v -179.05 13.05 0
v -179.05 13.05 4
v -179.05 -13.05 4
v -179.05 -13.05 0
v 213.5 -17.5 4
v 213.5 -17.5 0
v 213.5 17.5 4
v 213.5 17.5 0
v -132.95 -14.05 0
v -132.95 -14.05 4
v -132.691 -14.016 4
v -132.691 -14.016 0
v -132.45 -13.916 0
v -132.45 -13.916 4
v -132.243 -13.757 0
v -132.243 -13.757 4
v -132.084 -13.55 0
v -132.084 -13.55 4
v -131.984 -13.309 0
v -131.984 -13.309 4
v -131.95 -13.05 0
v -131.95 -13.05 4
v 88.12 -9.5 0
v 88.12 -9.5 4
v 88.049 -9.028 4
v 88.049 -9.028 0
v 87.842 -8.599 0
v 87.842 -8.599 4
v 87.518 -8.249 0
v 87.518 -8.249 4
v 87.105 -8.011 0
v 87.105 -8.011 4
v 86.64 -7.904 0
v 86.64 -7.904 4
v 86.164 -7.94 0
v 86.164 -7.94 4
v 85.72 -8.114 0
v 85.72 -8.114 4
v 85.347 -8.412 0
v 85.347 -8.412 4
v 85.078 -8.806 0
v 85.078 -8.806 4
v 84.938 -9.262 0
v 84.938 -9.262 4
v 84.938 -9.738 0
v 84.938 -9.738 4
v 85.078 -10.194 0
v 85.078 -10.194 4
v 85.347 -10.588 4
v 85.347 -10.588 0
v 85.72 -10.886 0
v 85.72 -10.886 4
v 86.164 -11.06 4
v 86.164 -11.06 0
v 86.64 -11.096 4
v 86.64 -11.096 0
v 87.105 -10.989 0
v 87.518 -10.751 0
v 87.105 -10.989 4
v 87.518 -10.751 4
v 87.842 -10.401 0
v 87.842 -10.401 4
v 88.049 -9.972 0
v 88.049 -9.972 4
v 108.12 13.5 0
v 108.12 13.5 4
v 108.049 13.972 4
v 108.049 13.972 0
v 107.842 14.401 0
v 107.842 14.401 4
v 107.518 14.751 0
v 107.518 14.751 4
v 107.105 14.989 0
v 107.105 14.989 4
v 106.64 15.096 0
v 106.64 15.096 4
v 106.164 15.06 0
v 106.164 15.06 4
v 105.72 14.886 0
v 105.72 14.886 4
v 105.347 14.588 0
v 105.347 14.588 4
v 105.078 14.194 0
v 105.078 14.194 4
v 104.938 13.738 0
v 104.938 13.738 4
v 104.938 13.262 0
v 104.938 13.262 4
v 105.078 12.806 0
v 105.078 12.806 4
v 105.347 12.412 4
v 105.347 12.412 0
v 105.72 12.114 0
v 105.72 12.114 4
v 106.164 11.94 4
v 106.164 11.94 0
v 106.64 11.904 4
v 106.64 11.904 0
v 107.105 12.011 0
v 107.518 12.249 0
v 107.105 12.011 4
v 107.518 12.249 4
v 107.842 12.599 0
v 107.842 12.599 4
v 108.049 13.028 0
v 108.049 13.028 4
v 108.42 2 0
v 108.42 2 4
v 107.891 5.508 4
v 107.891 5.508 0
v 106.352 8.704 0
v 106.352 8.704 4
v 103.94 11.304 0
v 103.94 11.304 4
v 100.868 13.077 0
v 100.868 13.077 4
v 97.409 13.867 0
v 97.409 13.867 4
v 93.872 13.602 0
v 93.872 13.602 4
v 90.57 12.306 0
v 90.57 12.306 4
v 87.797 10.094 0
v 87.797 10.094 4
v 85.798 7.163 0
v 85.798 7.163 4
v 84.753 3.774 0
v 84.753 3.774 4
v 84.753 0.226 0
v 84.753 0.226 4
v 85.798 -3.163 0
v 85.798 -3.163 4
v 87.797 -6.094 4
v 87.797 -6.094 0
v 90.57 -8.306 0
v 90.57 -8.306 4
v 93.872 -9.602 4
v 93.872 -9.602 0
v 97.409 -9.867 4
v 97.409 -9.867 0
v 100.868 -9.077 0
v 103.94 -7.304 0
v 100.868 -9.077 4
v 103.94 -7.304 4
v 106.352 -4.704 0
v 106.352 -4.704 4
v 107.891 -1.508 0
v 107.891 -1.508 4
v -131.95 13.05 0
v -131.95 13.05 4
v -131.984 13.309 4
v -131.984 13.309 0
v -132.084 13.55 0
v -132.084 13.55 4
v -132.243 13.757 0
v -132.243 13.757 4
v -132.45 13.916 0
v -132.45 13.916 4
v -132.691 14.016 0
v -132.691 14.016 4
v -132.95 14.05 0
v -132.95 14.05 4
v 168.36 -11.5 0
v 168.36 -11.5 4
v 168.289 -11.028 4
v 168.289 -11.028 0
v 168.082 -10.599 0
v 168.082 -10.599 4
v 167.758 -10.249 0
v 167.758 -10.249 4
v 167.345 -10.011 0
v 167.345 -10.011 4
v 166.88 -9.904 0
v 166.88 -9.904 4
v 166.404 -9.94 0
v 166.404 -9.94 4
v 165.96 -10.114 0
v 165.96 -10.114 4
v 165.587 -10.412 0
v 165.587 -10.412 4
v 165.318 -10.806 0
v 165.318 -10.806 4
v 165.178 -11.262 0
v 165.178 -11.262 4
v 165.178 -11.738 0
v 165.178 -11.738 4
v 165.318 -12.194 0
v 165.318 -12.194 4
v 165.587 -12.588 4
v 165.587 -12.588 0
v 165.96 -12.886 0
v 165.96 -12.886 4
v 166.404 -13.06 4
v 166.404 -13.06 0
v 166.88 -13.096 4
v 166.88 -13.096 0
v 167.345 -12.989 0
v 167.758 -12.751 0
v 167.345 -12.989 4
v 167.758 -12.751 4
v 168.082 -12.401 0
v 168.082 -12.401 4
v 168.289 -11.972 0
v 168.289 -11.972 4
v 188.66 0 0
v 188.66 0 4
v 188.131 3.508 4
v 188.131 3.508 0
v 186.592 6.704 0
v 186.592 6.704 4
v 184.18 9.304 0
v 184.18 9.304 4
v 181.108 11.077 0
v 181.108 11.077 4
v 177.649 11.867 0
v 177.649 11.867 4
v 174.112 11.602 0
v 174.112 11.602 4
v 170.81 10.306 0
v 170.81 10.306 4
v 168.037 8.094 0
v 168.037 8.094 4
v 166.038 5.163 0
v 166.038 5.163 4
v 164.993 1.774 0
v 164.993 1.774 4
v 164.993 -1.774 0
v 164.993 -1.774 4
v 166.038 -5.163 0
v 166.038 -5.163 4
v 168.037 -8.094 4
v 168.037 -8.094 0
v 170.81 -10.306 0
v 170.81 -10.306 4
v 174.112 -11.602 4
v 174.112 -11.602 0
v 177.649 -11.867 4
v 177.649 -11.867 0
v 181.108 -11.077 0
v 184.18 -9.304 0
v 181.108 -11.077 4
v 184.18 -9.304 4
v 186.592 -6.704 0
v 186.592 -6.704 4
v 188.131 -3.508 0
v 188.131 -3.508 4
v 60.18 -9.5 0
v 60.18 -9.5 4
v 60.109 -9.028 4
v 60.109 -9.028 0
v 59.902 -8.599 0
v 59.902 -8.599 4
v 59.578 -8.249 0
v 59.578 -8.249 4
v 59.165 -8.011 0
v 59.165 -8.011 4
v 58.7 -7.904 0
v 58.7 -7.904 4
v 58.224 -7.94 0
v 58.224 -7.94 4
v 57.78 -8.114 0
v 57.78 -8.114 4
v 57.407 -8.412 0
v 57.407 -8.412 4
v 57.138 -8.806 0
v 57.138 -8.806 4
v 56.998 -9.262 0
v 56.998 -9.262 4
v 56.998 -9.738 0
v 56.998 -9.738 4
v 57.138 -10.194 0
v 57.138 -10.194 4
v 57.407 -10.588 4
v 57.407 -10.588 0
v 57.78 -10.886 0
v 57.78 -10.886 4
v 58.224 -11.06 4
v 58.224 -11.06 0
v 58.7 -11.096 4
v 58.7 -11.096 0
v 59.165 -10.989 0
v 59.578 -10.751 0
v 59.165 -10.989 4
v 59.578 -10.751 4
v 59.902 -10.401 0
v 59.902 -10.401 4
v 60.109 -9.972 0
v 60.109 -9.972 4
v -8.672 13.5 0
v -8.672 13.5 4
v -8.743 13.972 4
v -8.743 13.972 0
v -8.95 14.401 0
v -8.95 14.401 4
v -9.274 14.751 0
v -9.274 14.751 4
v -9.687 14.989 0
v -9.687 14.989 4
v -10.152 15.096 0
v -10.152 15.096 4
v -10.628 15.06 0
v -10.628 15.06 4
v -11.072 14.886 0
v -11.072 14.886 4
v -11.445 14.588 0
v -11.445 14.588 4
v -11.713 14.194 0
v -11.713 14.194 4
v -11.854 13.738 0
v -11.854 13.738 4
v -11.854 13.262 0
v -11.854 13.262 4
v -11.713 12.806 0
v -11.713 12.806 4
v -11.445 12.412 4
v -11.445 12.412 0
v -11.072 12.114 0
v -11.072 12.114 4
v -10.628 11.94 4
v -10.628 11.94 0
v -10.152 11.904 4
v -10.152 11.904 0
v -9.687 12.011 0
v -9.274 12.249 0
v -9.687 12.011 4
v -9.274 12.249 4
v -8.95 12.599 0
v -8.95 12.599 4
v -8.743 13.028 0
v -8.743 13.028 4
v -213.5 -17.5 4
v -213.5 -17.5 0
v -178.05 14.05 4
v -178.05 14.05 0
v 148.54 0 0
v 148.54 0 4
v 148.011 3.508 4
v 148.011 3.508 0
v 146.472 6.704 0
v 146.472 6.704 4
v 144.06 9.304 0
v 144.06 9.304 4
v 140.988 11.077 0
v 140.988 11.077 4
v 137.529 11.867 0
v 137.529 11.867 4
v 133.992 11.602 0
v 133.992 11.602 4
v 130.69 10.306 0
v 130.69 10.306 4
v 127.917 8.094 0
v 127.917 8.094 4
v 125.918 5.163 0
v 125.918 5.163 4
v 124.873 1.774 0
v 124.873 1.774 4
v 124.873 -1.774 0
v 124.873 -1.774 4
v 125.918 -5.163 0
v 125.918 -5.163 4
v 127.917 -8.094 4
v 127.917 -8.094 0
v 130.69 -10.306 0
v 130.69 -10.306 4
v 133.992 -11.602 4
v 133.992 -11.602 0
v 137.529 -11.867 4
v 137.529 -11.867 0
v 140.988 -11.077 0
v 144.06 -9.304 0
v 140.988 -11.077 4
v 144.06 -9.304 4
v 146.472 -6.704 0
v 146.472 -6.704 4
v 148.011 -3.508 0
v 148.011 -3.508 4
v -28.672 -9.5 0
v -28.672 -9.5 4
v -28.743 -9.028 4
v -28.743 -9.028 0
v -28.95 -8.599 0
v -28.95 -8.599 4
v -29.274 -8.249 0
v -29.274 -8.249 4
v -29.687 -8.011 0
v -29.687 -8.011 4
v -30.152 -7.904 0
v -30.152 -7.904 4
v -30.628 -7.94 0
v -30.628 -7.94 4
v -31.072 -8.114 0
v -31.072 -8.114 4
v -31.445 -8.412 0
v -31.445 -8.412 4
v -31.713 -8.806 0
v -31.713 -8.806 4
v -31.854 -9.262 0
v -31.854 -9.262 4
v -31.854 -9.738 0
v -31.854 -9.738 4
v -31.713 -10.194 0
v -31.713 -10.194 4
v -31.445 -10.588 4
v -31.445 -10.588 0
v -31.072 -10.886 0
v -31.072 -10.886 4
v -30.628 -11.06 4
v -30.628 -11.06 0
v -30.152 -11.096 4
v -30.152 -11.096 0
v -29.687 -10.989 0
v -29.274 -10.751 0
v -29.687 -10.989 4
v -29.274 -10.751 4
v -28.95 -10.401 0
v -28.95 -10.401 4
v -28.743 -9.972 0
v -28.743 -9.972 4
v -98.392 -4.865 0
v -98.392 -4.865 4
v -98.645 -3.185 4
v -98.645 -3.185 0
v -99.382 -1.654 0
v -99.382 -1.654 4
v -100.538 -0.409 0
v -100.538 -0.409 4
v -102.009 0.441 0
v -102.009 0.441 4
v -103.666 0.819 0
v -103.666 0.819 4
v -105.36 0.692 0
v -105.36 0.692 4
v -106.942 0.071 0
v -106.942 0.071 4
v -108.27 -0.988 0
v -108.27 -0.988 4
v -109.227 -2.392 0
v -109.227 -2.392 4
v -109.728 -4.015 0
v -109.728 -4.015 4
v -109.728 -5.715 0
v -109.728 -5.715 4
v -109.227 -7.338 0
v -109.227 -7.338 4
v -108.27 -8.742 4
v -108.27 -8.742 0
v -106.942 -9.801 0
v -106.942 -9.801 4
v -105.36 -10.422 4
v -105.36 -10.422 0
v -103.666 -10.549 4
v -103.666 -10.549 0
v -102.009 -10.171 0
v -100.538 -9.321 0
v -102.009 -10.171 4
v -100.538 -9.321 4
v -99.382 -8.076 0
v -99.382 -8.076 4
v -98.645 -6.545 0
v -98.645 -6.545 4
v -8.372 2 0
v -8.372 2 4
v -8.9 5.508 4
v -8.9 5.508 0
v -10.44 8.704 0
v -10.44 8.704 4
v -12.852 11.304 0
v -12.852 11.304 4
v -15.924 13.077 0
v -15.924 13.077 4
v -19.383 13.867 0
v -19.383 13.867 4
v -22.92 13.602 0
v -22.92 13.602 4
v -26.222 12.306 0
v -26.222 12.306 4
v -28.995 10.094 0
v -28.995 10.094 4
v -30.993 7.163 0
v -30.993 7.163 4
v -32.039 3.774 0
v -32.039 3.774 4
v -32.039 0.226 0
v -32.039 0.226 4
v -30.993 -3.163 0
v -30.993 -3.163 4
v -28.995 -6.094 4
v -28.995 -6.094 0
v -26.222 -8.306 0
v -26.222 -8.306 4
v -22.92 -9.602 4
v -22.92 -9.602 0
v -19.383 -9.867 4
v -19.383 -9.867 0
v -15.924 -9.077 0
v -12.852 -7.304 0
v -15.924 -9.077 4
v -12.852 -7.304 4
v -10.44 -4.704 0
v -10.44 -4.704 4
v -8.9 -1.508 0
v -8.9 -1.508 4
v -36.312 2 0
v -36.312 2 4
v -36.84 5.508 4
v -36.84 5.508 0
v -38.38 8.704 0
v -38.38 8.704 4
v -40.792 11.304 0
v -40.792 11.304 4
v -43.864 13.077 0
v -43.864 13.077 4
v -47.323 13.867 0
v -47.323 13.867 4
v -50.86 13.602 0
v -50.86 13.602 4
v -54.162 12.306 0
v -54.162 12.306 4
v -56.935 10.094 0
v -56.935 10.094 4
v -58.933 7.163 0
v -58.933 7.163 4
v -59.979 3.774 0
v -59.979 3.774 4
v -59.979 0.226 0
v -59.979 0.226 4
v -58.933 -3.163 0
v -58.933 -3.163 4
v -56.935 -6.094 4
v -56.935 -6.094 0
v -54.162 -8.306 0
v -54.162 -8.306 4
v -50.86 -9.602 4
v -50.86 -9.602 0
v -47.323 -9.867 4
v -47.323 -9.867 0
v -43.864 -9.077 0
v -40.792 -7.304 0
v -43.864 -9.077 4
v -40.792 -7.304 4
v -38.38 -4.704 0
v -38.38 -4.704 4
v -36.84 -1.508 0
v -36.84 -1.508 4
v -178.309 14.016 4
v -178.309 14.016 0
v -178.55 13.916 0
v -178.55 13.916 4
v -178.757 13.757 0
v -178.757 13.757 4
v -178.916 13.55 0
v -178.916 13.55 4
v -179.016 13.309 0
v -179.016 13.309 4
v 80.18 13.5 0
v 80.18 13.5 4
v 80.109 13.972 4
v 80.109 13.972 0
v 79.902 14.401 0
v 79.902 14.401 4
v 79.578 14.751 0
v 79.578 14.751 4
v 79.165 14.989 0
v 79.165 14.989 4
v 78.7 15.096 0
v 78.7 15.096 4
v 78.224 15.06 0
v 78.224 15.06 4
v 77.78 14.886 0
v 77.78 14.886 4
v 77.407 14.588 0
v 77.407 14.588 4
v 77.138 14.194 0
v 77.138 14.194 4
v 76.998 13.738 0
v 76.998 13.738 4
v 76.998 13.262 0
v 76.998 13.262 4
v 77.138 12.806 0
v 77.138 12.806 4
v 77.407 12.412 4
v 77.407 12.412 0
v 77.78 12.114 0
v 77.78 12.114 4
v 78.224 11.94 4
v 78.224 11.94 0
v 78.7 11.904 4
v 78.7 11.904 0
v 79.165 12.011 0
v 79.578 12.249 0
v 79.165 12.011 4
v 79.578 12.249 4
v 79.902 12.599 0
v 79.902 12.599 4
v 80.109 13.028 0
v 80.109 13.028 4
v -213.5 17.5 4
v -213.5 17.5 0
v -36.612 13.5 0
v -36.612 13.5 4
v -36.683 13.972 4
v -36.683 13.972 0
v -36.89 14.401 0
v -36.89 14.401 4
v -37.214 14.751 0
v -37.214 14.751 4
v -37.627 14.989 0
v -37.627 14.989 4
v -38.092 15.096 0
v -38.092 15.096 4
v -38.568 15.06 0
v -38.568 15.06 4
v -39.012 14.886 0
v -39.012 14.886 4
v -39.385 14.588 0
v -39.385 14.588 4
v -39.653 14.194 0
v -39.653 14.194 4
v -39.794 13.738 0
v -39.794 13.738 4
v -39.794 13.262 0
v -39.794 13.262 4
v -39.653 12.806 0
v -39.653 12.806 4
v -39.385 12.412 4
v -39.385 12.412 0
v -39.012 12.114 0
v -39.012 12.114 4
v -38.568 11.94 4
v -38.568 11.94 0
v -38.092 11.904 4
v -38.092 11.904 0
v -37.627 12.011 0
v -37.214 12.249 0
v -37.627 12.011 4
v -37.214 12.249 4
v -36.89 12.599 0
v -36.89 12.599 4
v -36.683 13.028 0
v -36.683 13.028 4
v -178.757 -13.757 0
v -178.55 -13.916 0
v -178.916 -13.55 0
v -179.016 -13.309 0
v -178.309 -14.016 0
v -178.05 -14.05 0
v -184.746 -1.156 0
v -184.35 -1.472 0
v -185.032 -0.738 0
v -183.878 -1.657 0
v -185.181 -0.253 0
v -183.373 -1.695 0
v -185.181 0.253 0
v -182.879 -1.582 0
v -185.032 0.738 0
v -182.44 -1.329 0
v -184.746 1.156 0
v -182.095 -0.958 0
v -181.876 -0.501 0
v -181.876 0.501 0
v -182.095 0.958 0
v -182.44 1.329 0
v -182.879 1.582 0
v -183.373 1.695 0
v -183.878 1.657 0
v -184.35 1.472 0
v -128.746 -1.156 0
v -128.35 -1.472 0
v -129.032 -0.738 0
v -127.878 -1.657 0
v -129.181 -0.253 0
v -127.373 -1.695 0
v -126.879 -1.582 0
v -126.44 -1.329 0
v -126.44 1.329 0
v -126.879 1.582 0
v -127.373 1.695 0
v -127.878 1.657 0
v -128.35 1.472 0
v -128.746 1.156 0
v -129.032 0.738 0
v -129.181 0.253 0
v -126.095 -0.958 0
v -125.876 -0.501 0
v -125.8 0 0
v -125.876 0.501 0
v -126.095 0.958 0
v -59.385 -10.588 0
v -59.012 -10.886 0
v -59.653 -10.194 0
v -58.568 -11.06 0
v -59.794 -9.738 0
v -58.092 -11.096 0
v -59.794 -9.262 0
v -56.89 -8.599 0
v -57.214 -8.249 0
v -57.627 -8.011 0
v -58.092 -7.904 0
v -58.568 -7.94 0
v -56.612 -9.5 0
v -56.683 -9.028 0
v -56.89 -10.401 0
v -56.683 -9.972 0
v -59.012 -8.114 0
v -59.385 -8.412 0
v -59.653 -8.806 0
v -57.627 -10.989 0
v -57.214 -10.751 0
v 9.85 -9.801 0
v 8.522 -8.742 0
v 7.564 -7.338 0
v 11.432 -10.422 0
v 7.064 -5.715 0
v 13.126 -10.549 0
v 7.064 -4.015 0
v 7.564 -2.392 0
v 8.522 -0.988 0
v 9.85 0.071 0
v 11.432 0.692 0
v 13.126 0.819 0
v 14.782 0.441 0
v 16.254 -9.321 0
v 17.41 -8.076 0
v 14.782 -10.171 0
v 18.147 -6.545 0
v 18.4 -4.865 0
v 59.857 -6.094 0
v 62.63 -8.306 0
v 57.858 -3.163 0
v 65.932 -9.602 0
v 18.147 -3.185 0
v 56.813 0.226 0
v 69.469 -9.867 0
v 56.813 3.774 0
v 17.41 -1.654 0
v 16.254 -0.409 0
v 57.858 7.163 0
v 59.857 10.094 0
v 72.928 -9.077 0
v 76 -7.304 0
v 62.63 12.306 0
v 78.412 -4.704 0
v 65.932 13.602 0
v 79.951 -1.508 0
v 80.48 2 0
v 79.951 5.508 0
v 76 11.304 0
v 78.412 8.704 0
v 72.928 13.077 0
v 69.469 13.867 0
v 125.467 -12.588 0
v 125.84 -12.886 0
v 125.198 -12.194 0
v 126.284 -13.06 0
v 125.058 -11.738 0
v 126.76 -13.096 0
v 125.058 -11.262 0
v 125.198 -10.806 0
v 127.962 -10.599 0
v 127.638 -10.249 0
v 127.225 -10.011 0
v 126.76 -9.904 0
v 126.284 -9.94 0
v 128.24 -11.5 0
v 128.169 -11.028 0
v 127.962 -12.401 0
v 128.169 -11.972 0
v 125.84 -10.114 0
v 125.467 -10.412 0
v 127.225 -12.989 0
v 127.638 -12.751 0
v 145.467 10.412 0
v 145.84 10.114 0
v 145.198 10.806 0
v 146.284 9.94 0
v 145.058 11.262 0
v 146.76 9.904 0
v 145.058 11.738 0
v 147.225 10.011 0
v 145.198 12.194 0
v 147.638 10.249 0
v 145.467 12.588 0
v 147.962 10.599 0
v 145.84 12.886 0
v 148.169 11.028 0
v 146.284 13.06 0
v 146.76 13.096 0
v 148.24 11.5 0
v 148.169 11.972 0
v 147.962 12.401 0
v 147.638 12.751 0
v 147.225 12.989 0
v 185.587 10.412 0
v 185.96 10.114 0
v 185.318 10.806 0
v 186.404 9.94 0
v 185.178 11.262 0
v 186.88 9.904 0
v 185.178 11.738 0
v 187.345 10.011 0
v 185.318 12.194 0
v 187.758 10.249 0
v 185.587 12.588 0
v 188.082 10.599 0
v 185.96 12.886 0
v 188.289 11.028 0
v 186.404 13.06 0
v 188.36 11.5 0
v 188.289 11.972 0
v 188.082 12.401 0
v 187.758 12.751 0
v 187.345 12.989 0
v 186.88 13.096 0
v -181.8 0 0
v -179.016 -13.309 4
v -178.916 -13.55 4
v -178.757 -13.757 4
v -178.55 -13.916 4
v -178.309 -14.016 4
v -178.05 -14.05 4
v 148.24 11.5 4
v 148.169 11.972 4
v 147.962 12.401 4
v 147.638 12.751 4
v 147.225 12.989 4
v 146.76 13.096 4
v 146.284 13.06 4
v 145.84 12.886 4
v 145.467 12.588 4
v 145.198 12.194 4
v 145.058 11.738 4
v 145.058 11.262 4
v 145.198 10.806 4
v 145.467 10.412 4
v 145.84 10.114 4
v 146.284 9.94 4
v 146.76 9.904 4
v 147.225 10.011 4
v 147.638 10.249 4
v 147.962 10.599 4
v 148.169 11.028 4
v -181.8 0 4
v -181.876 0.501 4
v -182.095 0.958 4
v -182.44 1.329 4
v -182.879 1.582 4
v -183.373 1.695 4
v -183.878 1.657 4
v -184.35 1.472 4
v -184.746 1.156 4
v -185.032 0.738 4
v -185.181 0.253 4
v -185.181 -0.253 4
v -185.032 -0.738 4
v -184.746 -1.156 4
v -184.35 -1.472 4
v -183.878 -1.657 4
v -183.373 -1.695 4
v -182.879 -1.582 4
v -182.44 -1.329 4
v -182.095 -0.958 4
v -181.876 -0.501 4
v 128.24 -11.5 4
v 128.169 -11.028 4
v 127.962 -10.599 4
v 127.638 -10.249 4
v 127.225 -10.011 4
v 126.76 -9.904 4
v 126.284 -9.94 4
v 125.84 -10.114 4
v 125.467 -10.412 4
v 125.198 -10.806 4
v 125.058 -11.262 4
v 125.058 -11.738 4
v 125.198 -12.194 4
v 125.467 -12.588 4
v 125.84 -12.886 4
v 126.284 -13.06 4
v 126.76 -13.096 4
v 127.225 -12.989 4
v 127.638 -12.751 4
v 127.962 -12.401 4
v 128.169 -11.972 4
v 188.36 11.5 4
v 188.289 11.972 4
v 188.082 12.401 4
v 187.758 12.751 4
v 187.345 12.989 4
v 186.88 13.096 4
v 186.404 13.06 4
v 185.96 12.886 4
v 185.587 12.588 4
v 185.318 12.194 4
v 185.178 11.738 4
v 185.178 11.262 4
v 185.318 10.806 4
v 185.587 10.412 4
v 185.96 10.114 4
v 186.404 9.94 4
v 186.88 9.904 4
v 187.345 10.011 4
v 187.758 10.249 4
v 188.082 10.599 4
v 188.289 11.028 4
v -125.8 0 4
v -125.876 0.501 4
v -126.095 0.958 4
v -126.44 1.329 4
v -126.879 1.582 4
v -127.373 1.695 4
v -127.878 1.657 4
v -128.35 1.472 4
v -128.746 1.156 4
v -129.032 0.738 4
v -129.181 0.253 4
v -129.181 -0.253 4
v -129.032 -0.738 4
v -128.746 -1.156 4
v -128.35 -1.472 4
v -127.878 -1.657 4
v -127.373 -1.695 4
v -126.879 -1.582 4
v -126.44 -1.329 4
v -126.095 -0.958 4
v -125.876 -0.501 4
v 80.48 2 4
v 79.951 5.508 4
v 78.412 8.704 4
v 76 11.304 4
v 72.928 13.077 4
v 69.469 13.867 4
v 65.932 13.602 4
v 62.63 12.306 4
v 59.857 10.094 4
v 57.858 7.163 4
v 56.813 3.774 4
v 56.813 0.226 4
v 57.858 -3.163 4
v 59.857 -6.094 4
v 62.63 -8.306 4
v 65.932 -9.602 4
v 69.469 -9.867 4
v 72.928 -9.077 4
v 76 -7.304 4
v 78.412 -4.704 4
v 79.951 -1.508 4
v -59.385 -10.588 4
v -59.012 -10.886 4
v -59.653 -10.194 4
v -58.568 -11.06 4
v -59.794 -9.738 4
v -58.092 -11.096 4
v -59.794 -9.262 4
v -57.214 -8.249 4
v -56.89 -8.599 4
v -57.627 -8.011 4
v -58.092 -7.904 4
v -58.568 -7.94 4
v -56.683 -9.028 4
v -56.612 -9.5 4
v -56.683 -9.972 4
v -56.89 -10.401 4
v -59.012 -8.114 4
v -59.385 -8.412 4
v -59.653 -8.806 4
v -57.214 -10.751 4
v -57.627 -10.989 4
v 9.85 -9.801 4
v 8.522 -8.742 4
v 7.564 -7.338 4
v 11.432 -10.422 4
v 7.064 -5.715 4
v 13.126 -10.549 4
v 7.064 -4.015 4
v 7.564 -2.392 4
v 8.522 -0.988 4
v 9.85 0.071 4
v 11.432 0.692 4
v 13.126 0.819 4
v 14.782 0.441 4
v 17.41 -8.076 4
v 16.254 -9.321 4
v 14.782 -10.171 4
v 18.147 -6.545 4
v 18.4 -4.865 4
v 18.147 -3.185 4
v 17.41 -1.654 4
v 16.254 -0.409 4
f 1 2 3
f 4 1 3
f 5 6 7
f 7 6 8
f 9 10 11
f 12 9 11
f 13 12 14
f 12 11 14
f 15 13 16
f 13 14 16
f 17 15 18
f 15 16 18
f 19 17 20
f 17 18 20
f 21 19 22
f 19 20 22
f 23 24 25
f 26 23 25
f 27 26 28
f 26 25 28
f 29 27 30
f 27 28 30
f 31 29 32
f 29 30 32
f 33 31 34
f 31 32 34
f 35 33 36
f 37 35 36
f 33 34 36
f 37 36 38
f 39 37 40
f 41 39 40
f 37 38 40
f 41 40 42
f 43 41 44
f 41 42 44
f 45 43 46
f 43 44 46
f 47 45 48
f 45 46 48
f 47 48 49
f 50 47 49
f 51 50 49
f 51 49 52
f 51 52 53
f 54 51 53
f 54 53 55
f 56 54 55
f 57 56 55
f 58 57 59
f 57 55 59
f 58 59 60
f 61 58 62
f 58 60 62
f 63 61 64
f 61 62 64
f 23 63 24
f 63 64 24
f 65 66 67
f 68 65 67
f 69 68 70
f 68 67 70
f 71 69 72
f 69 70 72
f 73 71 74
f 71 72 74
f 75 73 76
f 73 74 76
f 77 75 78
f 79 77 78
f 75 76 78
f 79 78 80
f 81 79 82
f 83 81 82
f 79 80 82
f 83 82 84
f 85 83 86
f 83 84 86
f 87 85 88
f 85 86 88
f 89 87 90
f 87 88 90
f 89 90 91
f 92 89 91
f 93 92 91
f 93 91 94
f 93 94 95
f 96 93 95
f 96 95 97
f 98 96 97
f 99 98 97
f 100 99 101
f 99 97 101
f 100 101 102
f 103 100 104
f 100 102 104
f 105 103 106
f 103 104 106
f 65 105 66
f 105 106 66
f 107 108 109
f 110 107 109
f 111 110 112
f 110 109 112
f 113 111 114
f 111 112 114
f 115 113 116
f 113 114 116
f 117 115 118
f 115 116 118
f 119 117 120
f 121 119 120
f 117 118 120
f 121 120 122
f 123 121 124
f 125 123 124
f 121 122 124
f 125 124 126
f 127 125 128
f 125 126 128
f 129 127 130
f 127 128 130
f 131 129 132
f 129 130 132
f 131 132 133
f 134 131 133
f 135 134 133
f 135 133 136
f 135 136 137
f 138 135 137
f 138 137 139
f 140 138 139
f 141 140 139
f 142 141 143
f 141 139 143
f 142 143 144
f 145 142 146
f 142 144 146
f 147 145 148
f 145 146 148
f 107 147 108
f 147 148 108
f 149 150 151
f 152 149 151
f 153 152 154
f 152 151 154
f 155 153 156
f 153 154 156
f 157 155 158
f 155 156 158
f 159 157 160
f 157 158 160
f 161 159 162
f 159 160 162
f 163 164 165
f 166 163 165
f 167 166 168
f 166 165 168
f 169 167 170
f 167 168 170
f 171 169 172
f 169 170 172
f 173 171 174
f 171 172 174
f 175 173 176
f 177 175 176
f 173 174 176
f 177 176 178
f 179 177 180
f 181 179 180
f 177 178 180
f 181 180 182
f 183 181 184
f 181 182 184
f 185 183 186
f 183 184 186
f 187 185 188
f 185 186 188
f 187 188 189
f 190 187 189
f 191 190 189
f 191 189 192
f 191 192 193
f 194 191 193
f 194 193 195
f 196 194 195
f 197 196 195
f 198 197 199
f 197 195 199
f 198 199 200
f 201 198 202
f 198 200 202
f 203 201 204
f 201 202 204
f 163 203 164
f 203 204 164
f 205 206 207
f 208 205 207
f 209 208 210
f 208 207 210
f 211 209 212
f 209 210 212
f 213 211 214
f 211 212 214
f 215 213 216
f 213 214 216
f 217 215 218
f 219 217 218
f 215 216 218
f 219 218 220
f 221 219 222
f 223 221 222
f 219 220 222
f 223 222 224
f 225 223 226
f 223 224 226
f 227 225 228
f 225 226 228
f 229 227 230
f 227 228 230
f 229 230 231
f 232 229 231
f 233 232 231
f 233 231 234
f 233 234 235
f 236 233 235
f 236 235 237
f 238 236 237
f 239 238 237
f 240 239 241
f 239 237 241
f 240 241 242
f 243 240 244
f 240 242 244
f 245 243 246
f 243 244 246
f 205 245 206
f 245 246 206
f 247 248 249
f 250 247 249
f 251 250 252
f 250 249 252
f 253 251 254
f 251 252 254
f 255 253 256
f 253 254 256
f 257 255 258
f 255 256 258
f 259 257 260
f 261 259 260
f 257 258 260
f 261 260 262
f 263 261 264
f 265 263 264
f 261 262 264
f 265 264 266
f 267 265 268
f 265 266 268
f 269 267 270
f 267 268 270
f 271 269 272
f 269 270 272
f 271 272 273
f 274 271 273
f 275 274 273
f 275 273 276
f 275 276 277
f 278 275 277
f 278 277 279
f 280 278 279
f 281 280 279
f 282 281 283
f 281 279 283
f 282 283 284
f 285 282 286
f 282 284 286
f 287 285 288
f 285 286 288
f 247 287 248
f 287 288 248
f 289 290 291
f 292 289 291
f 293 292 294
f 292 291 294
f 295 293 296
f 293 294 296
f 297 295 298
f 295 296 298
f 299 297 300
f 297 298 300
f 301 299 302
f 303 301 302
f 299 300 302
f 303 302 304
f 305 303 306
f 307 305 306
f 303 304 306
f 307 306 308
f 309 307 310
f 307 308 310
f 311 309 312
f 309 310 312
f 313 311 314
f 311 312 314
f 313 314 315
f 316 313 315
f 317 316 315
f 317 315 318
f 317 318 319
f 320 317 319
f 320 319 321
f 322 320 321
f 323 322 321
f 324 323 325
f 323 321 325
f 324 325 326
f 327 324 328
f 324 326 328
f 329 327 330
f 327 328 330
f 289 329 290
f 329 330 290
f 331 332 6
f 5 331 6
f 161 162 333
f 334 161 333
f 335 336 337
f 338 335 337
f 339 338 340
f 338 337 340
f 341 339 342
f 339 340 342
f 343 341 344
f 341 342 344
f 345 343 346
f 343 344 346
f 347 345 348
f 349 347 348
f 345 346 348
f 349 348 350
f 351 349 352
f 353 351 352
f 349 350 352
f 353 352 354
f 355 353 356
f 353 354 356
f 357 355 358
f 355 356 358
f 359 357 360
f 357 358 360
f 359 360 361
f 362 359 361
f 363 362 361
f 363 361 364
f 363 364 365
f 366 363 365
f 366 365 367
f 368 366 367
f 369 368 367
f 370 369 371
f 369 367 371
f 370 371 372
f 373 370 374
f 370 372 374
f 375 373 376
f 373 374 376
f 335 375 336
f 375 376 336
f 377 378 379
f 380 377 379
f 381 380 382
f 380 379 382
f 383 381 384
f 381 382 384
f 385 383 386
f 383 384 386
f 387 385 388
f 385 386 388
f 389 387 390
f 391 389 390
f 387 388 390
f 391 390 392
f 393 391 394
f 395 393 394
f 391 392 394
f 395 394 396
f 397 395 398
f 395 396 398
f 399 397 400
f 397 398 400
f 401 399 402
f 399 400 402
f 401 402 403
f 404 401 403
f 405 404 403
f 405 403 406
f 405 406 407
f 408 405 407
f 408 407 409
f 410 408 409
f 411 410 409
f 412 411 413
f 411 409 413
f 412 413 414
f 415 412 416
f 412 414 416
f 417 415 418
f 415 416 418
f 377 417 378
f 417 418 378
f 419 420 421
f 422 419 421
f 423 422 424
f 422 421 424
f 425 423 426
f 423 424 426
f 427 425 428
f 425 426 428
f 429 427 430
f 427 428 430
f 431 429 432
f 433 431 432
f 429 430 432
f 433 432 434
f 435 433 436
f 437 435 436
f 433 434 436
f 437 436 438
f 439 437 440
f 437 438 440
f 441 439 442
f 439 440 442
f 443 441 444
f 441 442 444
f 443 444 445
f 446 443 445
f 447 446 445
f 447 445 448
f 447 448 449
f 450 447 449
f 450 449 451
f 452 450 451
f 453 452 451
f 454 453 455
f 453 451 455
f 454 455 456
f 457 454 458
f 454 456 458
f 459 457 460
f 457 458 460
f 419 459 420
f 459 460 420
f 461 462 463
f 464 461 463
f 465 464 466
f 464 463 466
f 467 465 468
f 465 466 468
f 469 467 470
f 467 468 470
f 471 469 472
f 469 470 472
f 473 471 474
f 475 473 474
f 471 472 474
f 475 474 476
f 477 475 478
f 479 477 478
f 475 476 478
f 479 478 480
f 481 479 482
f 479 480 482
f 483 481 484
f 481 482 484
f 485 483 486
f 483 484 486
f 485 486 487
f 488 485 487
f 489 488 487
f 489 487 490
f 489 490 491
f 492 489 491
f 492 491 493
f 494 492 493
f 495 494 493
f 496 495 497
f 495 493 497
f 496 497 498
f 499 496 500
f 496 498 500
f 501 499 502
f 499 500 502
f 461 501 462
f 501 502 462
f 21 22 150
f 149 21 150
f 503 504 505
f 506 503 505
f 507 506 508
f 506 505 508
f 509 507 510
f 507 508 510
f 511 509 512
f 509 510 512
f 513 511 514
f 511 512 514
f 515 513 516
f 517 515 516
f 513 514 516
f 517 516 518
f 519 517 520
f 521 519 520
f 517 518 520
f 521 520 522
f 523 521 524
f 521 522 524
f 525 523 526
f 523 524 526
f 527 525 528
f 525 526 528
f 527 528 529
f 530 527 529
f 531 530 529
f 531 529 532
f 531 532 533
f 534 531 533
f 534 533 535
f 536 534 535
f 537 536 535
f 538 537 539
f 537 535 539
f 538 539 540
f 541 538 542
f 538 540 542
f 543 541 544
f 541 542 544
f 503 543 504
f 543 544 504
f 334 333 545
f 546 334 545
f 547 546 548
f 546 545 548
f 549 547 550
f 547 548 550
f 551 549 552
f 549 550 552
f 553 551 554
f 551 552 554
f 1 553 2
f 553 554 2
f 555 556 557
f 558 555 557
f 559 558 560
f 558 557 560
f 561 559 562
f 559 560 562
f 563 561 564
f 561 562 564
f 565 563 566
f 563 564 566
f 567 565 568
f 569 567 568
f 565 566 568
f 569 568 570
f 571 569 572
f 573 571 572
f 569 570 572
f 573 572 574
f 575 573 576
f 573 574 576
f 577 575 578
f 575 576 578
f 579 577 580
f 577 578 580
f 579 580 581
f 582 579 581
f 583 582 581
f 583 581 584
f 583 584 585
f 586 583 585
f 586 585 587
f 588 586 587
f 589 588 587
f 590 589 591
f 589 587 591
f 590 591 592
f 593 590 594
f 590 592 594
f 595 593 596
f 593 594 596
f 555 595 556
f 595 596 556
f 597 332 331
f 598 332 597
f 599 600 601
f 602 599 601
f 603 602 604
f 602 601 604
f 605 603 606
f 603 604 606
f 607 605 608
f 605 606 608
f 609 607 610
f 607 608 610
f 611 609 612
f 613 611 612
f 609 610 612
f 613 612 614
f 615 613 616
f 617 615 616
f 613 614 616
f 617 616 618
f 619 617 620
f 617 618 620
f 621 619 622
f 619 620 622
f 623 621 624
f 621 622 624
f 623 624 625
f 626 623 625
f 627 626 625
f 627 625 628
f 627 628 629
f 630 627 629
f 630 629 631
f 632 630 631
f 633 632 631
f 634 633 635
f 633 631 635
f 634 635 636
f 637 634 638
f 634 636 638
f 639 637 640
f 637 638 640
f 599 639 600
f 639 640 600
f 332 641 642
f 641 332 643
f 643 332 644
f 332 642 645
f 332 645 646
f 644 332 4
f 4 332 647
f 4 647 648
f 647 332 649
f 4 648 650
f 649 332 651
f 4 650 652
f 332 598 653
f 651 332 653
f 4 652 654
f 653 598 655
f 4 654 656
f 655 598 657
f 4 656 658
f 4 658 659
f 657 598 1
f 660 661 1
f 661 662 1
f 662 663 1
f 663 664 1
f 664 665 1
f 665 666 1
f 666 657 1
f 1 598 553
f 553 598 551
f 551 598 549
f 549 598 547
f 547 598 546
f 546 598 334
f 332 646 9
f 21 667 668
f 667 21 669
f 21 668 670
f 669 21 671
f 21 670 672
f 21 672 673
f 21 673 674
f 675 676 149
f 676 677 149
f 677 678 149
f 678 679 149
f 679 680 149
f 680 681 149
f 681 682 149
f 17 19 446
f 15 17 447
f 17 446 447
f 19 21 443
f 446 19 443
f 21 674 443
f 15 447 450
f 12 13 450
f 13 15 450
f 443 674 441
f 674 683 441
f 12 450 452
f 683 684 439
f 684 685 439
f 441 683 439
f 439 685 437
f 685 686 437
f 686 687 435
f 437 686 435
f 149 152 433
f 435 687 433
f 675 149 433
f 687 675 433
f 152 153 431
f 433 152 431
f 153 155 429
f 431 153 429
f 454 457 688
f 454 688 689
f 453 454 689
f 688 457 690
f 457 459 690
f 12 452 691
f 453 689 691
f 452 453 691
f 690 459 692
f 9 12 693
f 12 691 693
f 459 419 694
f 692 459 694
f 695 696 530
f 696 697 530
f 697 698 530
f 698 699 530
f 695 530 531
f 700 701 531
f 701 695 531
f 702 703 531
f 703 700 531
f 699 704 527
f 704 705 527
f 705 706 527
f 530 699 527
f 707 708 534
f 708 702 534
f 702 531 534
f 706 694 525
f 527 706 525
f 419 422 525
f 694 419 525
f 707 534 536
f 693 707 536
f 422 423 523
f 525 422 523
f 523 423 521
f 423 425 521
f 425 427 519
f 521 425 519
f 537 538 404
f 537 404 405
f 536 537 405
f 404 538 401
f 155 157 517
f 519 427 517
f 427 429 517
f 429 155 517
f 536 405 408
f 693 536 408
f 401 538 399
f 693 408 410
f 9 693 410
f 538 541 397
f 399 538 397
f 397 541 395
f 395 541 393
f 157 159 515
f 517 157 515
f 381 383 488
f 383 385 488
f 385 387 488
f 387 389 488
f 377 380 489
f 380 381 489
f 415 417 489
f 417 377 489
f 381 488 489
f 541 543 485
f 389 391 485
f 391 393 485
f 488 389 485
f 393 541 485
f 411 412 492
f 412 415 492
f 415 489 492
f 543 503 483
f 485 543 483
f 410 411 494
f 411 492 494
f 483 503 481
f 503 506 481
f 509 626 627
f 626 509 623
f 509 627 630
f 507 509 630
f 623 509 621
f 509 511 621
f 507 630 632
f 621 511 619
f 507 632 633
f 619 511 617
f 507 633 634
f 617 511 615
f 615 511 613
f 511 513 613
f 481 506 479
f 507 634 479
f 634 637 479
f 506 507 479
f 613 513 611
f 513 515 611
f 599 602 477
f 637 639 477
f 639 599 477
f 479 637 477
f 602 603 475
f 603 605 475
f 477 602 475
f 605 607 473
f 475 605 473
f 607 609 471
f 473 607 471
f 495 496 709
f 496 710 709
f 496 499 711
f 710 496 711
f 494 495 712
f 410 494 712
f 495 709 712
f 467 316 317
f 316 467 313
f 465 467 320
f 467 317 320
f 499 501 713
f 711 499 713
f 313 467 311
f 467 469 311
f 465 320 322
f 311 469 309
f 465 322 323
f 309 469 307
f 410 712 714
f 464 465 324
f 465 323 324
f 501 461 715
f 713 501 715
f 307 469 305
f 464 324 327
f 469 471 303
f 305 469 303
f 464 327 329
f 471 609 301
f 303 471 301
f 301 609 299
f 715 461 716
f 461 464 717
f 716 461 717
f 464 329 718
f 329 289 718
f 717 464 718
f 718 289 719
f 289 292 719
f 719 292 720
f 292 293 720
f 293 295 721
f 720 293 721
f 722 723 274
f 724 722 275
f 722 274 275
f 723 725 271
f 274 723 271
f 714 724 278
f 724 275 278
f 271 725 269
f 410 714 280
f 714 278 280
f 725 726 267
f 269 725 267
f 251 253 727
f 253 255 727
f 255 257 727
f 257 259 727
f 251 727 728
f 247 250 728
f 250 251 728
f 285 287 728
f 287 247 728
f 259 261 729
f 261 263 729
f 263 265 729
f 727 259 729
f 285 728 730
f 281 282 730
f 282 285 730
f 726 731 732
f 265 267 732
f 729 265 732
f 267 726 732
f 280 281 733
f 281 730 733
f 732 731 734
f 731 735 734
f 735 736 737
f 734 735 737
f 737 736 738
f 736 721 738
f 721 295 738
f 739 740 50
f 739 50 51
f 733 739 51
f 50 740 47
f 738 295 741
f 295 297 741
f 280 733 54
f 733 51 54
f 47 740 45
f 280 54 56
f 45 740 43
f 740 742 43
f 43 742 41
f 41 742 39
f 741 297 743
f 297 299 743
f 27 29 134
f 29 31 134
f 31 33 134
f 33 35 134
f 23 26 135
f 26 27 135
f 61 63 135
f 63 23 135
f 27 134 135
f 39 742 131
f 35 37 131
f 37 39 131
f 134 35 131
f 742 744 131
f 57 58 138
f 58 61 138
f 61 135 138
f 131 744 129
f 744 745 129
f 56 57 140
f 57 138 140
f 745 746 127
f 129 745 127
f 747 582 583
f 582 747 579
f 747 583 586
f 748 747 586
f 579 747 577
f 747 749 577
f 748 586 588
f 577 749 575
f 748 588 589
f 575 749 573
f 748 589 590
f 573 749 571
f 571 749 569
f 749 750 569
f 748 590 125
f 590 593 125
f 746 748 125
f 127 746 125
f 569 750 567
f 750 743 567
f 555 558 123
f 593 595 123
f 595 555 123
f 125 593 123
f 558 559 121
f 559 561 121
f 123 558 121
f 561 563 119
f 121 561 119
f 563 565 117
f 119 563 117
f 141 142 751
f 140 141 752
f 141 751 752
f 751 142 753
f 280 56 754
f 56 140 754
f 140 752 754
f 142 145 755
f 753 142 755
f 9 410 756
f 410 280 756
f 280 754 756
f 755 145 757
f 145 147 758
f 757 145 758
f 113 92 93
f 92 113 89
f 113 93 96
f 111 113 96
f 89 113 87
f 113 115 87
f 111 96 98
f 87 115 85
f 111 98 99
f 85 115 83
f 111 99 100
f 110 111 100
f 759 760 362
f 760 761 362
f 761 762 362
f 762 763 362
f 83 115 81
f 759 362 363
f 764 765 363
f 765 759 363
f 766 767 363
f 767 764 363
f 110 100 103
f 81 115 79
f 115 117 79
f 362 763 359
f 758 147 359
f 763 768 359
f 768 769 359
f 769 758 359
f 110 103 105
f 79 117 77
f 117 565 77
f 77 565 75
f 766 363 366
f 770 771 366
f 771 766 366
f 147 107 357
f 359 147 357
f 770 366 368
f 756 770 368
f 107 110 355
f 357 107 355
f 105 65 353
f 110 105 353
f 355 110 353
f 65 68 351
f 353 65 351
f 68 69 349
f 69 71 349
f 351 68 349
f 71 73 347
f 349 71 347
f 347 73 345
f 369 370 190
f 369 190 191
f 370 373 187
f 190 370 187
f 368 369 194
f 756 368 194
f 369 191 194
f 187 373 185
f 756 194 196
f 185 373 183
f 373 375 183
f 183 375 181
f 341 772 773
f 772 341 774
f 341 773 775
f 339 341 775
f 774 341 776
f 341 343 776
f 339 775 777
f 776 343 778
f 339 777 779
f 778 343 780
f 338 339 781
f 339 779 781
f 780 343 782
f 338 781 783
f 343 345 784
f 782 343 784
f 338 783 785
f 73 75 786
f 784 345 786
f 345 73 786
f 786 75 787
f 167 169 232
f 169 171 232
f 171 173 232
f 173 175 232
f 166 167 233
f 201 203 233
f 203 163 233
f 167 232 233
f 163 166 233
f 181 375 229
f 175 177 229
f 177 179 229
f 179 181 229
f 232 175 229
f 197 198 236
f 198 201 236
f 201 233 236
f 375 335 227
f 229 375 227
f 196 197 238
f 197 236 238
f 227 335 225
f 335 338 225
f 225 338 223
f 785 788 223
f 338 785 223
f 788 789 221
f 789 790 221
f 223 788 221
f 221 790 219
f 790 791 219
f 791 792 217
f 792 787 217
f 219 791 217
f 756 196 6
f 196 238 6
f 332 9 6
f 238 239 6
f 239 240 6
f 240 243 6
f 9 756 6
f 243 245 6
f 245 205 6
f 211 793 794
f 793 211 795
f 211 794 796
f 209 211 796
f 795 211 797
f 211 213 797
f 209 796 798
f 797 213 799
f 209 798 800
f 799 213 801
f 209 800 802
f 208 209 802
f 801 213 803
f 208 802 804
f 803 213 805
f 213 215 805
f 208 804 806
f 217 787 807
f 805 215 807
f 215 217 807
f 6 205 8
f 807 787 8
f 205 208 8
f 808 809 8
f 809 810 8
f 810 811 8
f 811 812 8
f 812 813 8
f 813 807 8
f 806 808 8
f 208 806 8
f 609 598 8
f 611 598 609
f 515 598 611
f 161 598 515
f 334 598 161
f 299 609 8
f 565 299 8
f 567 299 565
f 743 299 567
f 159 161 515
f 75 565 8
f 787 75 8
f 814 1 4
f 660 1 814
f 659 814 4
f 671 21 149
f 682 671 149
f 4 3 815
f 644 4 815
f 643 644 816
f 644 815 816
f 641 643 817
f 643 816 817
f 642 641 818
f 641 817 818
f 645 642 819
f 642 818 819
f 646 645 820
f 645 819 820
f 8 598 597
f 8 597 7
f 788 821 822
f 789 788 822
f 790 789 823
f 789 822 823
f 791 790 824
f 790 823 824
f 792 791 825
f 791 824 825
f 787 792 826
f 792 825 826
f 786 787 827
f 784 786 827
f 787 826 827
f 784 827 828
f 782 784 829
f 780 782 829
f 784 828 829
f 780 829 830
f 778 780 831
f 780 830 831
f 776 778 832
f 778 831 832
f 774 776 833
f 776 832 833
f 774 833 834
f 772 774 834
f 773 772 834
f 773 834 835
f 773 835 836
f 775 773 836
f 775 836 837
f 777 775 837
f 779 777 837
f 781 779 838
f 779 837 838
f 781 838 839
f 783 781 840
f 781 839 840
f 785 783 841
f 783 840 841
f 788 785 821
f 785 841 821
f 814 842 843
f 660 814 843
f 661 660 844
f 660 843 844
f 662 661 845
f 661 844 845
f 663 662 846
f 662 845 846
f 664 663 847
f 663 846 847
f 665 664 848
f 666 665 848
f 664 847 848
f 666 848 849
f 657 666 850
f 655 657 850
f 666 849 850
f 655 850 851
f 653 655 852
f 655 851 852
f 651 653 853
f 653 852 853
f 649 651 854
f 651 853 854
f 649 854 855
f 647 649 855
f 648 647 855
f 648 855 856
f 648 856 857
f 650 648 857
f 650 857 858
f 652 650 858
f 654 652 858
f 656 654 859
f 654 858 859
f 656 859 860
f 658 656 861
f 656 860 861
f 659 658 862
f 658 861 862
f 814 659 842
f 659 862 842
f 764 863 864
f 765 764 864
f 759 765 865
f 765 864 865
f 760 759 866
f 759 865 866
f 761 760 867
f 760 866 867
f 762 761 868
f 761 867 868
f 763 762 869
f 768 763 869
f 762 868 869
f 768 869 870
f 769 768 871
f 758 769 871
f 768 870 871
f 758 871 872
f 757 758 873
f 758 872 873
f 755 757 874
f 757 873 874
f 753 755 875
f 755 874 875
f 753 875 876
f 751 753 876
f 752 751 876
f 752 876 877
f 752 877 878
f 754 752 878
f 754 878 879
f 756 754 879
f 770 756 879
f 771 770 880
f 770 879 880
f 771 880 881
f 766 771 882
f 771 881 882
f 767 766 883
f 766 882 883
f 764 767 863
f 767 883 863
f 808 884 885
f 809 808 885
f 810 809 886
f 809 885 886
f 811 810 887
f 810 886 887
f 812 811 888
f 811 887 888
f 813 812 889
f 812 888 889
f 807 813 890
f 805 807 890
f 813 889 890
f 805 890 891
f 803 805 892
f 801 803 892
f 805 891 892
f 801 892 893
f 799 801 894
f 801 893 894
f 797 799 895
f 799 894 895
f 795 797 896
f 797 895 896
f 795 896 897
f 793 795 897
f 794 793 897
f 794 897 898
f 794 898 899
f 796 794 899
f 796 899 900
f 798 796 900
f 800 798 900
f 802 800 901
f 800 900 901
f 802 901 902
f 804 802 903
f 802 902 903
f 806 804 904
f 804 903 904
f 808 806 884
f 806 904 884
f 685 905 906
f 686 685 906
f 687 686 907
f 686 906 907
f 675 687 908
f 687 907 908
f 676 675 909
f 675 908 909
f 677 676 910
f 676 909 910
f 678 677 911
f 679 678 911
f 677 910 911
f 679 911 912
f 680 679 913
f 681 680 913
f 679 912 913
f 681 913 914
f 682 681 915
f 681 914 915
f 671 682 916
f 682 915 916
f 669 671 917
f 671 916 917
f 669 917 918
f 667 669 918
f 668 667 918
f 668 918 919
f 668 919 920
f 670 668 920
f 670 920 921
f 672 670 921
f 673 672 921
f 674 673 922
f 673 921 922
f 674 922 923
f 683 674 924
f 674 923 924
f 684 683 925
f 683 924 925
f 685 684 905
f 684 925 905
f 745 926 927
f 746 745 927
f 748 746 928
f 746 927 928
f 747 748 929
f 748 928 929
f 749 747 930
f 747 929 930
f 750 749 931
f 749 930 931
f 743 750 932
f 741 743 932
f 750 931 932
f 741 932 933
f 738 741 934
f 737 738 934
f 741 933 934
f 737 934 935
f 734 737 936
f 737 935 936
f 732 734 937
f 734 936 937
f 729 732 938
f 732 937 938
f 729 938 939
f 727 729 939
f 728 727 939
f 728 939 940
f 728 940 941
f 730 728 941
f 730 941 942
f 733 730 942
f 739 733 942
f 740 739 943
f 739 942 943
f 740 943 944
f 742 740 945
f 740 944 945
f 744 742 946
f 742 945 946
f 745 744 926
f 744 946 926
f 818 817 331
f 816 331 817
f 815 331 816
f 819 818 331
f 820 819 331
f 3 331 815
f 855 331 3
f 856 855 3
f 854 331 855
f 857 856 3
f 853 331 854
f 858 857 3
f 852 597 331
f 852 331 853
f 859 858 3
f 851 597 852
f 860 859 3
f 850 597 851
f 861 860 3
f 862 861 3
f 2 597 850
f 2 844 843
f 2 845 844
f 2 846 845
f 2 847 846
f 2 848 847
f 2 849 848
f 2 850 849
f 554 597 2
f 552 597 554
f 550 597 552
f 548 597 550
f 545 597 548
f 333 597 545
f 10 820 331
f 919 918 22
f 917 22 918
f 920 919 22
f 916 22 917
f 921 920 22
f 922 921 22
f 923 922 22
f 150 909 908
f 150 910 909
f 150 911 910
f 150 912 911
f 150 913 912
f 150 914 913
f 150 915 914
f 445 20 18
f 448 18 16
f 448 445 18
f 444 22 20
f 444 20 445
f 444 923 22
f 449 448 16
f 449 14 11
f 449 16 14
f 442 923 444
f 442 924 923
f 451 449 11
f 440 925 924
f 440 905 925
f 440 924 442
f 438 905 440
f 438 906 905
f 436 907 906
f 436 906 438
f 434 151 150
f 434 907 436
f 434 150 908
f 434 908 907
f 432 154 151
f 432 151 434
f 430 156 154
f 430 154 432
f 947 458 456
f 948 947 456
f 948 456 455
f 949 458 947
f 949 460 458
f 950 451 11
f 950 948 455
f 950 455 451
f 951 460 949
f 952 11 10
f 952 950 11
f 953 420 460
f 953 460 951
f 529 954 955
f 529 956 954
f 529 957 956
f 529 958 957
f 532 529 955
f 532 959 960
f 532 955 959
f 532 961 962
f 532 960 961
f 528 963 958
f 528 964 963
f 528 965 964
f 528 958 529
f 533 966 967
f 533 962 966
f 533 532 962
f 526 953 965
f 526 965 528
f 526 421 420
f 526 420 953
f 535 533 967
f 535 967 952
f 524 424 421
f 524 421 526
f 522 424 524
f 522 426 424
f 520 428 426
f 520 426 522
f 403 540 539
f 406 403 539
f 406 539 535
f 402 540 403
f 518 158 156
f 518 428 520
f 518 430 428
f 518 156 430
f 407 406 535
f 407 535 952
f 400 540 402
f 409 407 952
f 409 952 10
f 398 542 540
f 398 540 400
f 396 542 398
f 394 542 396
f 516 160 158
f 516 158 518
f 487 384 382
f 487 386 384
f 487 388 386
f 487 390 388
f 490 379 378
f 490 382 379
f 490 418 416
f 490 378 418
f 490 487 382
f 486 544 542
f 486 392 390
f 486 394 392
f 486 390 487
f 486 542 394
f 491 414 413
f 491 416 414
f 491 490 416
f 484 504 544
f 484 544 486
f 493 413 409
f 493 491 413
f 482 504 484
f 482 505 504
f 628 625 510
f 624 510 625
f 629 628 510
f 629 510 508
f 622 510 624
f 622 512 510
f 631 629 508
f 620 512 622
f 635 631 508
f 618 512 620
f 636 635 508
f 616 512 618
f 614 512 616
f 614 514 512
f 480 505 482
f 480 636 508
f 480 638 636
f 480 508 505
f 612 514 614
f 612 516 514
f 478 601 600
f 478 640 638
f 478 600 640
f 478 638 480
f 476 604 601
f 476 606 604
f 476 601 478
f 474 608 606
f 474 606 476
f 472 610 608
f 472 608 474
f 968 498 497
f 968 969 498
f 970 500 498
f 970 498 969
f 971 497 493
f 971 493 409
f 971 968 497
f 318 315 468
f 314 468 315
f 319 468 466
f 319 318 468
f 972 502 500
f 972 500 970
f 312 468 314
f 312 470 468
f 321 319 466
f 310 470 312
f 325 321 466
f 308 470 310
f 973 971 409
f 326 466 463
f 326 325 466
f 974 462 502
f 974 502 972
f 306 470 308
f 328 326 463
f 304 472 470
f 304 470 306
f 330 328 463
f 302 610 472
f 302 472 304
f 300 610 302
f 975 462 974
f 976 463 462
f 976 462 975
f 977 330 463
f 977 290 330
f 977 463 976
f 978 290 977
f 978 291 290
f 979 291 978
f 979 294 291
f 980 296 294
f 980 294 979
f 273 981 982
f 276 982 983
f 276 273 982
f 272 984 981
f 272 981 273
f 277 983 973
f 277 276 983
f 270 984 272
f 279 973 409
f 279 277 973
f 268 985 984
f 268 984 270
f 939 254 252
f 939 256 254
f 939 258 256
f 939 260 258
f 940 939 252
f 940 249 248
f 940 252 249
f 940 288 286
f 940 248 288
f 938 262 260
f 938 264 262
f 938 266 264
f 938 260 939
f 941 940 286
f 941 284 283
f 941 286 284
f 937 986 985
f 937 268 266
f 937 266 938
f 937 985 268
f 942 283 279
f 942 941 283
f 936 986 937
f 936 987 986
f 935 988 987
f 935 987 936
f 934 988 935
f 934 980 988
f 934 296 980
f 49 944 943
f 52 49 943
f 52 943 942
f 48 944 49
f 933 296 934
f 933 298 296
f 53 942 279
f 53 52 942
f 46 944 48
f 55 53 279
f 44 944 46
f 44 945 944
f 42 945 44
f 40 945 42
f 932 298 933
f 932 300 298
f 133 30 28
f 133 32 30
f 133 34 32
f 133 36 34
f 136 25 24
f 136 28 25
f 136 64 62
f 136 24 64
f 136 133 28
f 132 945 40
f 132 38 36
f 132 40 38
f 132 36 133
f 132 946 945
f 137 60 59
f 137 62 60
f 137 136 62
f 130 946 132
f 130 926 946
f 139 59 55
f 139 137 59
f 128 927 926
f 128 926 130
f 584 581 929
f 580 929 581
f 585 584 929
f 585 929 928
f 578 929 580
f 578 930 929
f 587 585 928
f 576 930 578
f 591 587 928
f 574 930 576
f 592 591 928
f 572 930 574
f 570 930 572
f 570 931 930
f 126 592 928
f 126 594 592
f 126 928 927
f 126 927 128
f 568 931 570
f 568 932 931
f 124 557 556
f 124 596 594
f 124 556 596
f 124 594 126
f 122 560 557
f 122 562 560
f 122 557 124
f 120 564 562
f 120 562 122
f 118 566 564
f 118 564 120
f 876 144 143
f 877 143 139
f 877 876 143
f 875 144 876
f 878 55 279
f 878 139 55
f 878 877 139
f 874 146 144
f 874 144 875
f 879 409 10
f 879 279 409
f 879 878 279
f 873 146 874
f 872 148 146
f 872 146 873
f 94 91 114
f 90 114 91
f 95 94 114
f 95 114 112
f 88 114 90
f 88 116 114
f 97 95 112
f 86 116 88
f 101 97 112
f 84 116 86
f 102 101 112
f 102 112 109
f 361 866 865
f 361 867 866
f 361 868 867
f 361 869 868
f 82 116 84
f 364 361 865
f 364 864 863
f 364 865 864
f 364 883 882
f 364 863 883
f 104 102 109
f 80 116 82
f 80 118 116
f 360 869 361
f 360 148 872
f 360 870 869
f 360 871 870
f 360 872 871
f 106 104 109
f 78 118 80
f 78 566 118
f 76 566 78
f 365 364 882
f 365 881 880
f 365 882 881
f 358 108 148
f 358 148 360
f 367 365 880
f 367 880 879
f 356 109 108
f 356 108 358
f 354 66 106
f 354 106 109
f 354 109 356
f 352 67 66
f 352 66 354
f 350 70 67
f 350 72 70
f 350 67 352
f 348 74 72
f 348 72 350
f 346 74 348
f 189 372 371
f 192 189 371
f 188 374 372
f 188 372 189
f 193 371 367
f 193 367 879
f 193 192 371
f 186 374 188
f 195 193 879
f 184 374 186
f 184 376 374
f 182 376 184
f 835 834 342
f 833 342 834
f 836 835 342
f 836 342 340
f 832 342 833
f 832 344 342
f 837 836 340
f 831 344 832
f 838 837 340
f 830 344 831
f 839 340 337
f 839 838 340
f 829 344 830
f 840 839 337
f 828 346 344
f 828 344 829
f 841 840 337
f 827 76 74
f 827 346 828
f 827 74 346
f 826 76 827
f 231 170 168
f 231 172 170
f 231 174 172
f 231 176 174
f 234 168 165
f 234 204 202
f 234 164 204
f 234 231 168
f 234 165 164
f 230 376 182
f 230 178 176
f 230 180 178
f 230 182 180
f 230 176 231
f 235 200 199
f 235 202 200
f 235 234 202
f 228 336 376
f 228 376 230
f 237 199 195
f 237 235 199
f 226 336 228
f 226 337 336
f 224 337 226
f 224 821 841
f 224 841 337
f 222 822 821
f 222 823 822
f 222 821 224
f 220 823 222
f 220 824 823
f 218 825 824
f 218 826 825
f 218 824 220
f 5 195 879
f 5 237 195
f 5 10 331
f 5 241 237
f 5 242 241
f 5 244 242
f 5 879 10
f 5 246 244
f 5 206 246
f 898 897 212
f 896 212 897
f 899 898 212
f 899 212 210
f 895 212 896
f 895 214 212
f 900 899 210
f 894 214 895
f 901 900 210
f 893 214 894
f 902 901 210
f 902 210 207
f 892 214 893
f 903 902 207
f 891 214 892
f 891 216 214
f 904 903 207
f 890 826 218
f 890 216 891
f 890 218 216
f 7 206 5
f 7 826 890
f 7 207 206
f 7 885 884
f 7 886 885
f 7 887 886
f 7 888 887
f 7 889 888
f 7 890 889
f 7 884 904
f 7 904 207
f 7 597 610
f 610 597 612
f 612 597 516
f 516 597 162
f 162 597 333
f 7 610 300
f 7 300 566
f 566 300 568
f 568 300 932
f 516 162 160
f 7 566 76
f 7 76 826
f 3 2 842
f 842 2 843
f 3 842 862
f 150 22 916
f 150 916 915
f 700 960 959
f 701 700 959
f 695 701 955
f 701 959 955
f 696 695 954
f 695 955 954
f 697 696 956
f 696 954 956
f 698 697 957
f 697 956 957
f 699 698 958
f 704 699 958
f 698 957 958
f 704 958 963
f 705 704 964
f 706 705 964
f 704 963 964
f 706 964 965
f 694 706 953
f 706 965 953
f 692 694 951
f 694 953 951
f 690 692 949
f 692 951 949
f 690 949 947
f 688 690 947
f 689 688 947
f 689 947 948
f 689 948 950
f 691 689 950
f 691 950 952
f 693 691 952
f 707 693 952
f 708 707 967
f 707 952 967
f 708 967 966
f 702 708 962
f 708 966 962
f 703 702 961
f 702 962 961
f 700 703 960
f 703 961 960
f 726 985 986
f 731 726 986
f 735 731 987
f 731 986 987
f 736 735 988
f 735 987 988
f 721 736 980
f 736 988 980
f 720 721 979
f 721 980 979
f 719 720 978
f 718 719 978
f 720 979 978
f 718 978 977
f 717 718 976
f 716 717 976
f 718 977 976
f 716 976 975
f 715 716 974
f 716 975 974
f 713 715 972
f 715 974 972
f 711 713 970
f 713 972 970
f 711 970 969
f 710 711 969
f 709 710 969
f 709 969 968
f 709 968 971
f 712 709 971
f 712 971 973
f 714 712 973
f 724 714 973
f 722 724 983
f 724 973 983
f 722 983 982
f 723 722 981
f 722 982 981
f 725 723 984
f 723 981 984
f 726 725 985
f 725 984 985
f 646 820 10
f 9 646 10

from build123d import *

# Parameters (mm, degrees)
SKETCH1_W           = 427
SKETCH1_H           = 35
BOSS_EXTRUDE1_DEPTH = 4
SKETCH2_R           = 11.9
SKETCH2_R_2         = 1.6
SKETCH2_R_3         = 5.7
SKETCH2_R_4         = 1.7
CUT_EXTRUDE1_DEPTH  = 4


with BuildPart() as part:
    # Sketch1 → Boss-Extrude1 (new body)
    with BuildSketch(Plane.XY):
        Rectangle(SKETCH1_W, SKETCH1_H)
    extrude(amount=BOSS_EXTRUDE1_DEPTH)

    # Sketch2 → Cut-Extrude1 (cut)
    with BuildSketch(Plane.XY.offset(4)):
        with Locations((-20.271803936, 2)):
            Circle(SKETCH2_R)
        with Locations((-30.271803936, -9.5)):
            Circle(SKETCH2_R_2)
        with Locations((-10.271803936, 13.5)):
            Circle(SKETCH2_R_2)
        with Locations((-58.211803936, -9.5)):
            Circle(SKETCH2_R_2)
        with Locations((-48.211803936, 2)):
            Circle(SKETCH2_R)
        with Locations((-38.211803936, 13.5)):
            Circle(SKETCH2_R_2)
        with Locations((126.64, -11.5)):
            Circle(SKETCH2_R_2)
        with Locations((146.64, 11.5)):
            Circle(SKETCH2_R_2)
        with Locations((136.64, 0)):
            Circle(SKETCH2_R)
        with Locations((166.76, -11.5)):
            Circle(SKETCH2_R_2)
        with Locations((186.76, 11.5)):
            Circle(SKETCH2_R_2)
        with Locations((176.76, 0)):
            Circle(SKETCH2_R)
        with Locations((-104.091803936, -4.865)):
            Circle(SKETCH2_R_3)
        with Locations((86.52, -9.5)):
            Circle(SKETCH2_R_2)
        with Locations((106.52, 13.5)):
            Circle(SKETCH2_R_2)
        with Locations((68.58, 2)):
            Circle(SKETCH2_R)
        with Locations((96.52, 2)):
            Circle(SKETCH2_R)
        with Locations((12.7, -4.865)):
            Circle(SKETCH2_R_3)
        with Locations((78.58, 13.5)):
            Circle(SKETCH2_R_2)
        with Locations((58.58, -9.5)):
            Circle(SKETCH2_R_2)
        with Locations((-127.5, 0)):
            Circle(SKETCH2_R_4)
        with Locations((-183.5, 0)):
            Circle(SKETCH2_R_4)
        with BuildLine():
            Line((-178.05, -14.05), (-132.95, -14.05))
            ThreePointArc((-132.95, -14.05), (-132.242893219, -13.757106781), (-131.95, -13.05))
            Line((-131.95, -13.05), (-131.95, 13.05))
            ThreePointArc((-131.95, 13.05), (-132.242893219, 13.757106781), (-132.95, 14.05))
            Line((-132.95, 14.05), (-178.05, 14.05))
            ThreePointArc((-178.05, 14.05), (-178.757106781, 13.757106781), (-179.05, 13.05))
            Line((-179.05, 13.05), (-179.05, -13.05))
            ThreePointArc((-179.05, -13.05), (-178.757106781, -13.757106781), (-178.05, -14.05))
        make_face()
    extrude(amount=-CUT_EXTRUDE1_DEPTH, mode=Mode.SUBTRACT)


solid = part.part
